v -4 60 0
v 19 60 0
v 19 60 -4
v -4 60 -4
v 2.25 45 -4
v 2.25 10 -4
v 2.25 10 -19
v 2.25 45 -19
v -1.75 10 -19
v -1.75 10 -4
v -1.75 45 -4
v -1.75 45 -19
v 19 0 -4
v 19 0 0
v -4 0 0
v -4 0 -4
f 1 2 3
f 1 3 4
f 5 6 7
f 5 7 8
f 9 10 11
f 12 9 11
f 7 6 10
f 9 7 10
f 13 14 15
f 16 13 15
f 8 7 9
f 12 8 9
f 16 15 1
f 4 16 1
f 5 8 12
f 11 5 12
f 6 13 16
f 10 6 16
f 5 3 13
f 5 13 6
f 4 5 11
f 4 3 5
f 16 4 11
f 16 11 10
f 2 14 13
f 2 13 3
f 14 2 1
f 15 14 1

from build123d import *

# Parameters (mm, degrees)
SKETCH1_W           = 15
SKETCH1_H           = 80
BOSS_EXTRUDE1_DEPTH = 5
SKETCH3_W           = 23
SKETCH3_H           = 60
BOSS_EXTRUDE3_DEPTH = 4
SKETCH5_W           = 4
SKETCH5_H           = 50
BOSS_EXTRUDE5_DEPTH = 15
SKETCH6_W           = 15
SKETCH6_H           = 5
CUT_EXTRUDE1_DEPTH  = 80
SKETCH7_W           = 4
SKETCH7_H           = 15
CUT_EXTRUDE2_DEPTH  = 15


with BuildPart() as part:
    # Sketch1 → Boss-Extrude1 (new body)
    with BuildSketch(Plane(origin=(0, 0, 0), x_dir=(1, 0, 0), z_dir=(0, 1, 0))):
        with Locations((7.5, -40)):
            Rectangle(SKETCH1_W, SKETCH1_H)
    extrude(amount=BOSS_EXTRUDE1_DEPTH)

    # Sketch3 → Boss-Extrude3 (add)
    with BuildSketch(Plane(origin=(0, 0, 0), x_dir=(-1, 0, 0), z_dir=(0, 0, -1))):
        with Locations((-7.5, 30)):
            Rectangle(SKETCH3_W, SKETCH3_H)
    extrude(amount=BOSS_EXTRUDE3_DEPTH)

    # Sketch5 → Boss-Extrude5 (add)
    with BuildSketch(Plane(origin=(0, 0, -4), x_dir=(-1, 0, 0), z_dir=(0, 0, -1))):
        with Locations((-0.25, 35)):
            Rectangle(SKETCH5_W, SKETCH5_H)
    extrude(amount=BOSS_EXTRUDE5_DEPTH)

    # Sketch6 → Cut-Extrude1 (cut)
    with BuildSketch(Plane.XY.offset(80)):
        with Locations((7.5, 2.5)):
            Rectangle(SKETCH6_W, SKETCH6_H)
    extrude(amount=-CUT_EXTRUDE1_DEPTH, mode=Mode.SUBTRACT)

    # Sketch7 → Cut-Extrude2 (cut)
    with BuildSketch(Plane(origin=(0, 0, -19), x_dir=(-1, 0, 0), z_dir=(0, 0, -1))):
        with Locations((-0.25, 52.5)):
            Rectangle(SKETCH7_W, SKETCH7_H)
    extrude(amount=-CUT_EXTRUDE2_DEPTH, mode=Mode.SUBTRACT)


solid = part.part
